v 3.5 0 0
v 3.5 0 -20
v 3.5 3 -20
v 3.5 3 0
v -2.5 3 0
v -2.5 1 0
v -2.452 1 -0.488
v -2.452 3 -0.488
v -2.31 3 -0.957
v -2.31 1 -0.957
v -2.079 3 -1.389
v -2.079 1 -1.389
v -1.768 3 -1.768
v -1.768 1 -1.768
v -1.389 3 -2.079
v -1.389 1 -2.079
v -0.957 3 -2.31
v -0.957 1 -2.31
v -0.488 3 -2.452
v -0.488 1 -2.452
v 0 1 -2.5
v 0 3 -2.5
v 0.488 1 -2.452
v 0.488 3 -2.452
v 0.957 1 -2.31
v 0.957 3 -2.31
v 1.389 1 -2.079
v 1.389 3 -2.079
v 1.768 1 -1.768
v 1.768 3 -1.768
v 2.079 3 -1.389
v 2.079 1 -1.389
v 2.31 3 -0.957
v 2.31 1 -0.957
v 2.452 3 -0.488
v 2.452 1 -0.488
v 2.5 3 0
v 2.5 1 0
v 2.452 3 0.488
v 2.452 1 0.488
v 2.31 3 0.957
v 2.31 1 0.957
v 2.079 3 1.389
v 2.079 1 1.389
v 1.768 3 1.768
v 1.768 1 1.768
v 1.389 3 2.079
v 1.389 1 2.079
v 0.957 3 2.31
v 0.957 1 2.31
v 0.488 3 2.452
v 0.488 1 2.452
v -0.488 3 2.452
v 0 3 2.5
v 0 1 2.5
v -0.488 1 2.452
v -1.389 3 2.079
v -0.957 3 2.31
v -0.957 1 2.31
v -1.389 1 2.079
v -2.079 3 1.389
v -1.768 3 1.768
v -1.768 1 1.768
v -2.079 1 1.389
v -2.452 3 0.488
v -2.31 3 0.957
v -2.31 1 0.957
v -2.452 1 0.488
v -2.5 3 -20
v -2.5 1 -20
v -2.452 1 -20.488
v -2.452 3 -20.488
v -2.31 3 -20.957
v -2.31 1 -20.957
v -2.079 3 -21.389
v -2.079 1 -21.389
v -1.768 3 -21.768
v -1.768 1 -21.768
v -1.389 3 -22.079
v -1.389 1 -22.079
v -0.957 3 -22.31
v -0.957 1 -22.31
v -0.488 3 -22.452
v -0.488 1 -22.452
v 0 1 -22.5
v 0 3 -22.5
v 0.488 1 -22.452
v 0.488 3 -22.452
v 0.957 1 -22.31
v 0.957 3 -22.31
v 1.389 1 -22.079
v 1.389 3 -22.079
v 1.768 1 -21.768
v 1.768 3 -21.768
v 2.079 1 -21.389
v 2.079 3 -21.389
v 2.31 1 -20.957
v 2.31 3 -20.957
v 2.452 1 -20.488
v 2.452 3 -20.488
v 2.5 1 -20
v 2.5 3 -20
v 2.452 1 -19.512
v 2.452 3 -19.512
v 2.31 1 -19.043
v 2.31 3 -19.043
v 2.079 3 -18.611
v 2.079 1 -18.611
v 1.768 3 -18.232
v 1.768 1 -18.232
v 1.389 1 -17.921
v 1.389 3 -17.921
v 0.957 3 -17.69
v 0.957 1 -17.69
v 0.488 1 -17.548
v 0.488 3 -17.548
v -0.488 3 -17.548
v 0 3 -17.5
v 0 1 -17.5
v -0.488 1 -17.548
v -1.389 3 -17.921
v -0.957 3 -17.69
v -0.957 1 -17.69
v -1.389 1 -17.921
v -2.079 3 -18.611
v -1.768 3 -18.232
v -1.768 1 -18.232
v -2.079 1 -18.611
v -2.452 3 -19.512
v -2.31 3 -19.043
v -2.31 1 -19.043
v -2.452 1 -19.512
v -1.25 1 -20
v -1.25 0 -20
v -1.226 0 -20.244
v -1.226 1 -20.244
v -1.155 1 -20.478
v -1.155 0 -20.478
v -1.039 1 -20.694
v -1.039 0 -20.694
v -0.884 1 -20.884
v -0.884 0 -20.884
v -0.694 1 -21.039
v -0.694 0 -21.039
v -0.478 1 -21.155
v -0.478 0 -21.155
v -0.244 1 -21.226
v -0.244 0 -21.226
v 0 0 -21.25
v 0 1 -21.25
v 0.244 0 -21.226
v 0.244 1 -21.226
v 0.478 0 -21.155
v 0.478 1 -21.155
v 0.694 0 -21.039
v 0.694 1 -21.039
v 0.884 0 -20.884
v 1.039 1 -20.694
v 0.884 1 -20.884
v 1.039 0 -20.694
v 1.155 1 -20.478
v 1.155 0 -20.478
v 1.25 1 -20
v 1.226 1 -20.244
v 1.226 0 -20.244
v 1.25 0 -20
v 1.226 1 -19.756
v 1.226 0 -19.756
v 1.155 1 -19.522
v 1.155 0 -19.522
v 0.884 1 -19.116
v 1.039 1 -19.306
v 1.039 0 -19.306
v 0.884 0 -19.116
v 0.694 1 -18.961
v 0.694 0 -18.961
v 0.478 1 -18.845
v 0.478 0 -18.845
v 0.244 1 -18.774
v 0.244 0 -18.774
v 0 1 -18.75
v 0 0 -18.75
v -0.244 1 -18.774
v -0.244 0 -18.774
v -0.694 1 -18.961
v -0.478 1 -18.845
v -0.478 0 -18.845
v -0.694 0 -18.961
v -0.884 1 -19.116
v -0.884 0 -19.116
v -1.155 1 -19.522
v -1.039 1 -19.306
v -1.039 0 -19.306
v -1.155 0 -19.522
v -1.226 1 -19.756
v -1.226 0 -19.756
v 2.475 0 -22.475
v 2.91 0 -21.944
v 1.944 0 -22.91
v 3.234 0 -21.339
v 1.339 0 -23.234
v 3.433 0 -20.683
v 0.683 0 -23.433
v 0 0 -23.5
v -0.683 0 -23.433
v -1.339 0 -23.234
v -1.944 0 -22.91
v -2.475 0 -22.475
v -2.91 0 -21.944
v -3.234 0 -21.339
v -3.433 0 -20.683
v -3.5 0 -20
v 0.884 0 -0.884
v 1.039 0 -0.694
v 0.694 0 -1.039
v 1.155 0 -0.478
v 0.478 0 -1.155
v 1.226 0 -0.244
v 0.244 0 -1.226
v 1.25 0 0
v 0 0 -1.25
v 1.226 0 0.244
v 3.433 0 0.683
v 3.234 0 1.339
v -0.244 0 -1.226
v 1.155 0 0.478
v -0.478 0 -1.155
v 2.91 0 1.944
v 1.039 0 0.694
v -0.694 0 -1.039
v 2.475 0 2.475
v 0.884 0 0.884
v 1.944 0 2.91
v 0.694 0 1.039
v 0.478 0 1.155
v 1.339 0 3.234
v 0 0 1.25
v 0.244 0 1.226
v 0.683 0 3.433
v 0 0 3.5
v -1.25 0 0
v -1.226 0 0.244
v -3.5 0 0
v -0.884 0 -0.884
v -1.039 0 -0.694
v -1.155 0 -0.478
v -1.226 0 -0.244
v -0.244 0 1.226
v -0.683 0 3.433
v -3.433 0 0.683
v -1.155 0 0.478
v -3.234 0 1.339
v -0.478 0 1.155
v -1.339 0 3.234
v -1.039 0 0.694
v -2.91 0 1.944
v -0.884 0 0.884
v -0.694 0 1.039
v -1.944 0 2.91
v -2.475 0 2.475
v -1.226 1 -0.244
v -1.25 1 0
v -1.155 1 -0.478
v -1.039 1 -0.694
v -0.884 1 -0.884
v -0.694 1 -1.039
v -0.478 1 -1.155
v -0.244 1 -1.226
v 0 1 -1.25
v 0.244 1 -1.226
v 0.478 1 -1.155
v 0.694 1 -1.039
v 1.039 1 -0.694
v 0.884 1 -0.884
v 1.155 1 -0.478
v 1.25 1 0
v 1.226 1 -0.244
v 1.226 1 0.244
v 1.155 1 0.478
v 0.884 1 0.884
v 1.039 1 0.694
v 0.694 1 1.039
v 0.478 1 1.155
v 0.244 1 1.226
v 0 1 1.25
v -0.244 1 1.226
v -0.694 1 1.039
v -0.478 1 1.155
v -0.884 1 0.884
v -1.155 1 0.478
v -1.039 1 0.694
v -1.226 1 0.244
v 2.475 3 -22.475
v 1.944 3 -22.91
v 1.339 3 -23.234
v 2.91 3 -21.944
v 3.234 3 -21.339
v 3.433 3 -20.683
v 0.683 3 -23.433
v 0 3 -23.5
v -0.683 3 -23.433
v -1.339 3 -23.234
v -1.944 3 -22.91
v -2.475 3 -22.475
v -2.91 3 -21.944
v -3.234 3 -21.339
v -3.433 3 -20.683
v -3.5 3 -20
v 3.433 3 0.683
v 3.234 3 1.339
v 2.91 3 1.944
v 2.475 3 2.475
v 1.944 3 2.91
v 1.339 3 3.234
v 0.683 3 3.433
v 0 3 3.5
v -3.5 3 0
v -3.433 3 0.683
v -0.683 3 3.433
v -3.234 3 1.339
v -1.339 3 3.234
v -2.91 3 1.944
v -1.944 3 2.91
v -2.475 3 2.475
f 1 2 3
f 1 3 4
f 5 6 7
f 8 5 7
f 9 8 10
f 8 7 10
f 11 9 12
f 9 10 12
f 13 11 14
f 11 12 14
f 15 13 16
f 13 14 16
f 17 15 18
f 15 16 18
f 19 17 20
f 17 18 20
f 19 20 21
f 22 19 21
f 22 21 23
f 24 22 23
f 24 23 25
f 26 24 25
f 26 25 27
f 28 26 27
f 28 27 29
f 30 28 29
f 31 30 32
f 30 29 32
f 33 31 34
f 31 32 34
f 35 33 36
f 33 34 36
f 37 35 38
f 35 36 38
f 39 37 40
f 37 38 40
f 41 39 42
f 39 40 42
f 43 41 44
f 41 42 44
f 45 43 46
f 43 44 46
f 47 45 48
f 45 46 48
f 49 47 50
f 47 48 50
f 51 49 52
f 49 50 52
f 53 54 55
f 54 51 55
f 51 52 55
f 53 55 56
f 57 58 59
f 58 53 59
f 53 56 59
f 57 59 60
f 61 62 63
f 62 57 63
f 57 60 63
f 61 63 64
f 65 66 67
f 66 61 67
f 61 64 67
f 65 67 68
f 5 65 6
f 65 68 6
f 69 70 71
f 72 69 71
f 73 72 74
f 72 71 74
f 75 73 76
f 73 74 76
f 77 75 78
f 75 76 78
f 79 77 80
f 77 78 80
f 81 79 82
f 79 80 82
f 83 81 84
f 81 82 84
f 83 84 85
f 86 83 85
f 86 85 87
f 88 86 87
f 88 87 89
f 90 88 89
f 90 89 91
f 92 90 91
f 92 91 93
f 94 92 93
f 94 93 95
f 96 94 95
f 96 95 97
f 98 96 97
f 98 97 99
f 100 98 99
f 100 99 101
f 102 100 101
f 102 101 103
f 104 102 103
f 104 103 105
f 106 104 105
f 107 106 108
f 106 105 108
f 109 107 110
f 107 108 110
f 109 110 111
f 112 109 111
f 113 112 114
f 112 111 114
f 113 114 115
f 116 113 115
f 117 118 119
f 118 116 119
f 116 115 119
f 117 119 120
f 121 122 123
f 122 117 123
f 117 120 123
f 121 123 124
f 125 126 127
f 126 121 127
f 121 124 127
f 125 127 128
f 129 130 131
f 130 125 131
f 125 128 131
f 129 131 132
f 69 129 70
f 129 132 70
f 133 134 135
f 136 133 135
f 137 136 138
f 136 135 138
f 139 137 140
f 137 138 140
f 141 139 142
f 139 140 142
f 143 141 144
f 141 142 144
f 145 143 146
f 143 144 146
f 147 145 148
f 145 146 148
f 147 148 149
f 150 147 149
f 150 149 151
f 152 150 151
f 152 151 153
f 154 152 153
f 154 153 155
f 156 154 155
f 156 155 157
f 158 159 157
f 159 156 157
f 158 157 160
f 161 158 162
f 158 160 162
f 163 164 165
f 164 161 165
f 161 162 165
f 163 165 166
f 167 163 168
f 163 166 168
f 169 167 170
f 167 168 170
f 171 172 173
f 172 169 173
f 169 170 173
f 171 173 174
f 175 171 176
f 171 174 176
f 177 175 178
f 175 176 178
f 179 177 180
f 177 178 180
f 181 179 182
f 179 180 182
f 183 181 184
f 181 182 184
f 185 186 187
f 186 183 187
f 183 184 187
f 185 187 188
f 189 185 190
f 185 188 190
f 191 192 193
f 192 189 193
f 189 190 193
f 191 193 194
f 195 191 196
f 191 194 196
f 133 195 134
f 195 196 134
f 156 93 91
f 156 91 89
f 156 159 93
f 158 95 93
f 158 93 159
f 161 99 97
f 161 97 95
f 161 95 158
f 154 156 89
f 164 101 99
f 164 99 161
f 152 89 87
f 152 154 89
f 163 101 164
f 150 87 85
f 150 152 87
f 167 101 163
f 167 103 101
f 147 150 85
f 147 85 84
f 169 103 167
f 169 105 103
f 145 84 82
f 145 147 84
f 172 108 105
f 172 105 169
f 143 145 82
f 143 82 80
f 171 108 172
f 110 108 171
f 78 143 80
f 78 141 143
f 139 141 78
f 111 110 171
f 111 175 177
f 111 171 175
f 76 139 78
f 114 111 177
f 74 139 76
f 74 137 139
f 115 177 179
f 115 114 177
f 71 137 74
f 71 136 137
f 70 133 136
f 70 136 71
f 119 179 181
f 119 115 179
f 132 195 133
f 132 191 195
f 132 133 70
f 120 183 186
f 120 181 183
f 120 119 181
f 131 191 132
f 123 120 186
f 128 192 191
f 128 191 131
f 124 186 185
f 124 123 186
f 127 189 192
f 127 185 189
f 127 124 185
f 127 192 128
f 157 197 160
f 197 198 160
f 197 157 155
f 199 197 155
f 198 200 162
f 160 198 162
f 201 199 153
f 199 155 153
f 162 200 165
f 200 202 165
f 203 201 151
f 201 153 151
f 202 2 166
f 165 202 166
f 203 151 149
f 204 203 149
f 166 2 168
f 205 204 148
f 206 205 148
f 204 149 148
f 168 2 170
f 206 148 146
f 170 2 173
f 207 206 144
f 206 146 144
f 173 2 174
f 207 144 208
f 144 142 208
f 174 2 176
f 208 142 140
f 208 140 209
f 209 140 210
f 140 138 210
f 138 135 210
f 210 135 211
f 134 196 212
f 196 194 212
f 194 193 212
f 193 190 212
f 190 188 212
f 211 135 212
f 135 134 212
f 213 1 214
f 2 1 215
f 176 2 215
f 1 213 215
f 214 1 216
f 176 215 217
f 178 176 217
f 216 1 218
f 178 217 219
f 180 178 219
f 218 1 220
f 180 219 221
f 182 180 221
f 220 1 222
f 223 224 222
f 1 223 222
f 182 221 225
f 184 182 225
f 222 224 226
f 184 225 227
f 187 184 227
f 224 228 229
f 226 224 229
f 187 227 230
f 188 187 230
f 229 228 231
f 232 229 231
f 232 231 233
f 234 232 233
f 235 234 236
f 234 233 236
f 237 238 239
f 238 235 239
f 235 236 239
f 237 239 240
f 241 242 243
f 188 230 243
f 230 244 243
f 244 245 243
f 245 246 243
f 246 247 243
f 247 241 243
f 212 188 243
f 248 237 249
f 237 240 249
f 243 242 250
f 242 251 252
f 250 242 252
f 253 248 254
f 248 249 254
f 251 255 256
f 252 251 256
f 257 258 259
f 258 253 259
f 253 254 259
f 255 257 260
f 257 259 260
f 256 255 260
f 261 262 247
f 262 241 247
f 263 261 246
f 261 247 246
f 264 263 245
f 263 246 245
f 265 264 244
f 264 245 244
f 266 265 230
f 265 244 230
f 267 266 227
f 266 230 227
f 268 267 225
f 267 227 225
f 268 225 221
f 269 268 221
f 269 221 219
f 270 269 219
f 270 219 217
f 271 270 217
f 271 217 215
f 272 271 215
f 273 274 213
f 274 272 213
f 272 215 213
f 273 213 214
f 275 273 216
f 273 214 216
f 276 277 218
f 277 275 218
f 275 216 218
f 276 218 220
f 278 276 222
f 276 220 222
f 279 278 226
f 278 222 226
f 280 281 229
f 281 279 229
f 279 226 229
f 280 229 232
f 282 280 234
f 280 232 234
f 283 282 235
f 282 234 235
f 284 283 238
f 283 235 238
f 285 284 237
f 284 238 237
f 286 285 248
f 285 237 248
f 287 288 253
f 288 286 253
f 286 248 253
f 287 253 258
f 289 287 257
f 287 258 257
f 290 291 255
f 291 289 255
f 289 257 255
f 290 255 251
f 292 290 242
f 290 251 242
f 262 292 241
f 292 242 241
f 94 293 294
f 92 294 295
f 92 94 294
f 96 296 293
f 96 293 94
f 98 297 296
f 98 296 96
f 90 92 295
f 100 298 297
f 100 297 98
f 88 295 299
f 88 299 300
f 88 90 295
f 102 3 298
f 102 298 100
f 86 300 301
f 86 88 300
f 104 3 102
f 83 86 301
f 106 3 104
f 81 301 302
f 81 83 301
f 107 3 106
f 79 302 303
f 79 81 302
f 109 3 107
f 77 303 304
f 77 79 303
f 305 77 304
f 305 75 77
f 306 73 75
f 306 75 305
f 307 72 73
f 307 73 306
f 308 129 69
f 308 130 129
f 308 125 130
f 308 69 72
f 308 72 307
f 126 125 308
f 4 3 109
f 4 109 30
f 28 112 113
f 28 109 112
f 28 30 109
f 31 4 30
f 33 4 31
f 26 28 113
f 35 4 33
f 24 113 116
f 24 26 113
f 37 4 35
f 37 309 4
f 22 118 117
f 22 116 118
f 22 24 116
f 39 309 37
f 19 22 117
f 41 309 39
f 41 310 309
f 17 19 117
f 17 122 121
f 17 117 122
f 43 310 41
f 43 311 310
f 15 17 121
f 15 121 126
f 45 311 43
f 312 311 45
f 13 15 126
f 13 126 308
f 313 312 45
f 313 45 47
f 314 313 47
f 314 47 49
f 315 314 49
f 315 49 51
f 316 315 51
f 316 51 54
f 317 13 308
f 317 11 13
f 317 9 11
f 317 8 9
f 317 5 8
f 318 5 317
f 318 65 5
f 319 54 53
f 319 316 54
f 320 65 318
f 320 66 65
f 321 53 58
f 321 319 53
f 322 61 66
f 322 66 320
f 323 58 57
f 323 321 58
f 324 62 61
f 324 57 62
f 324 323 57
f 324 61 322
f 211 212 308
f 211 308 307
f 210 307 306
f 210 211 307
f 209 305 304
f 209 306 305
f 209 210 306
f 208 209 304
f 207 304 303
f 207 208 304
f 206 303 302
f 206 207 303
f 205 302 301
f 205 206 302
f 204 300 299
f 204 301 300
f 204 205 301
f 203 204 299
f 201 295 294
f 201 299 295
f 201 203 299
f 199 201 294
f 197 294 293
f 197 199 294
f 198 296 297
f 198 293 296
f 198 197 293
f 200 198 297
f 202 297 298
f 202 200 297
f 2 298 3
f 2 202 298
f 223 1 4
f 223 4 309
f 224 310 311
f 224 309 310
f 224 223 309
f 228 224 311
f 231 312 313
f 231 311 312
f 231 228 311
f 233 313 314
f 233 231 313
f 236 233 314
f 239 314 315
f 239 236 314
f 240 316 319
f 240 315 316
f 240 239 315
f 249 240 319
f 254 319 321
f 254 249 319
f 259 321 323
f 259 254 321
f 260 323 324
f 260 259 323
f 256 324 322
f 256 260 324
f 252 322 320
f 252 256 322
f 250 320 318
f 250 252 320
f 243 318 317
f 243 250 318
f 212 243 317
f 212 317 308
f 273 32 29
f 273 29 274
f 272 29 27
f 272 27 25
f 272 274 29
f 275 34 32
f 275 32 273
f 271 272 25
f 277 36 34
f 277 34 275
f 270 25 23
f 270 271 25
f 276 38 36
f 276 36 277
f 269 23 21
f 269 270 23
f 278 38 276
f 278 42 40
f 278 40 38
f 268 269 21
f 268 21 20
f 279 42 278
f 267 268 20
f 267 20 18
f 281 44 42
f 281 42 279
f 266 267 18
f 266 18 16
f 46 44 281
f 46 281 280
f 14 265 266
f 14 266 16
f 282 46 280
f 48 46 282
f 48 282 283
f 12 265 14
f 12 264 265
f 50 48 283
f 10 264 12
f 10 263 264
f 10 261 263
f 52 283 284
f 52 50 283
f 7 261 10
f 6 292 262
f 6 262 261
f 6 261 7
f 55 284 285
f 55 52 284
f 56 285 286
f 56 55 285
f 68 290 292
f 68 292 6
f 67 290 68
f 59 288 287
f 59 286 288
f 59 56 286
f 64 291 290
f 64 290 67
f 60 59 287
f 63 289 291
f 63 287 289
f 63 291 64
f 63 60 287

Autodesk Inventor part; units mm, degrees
ref_plane "YZ Plane" through (0, 0, 0) normal (1, 0, 0) x (0, 1, 0)
ref_plane "XZ Plane" through (0, 0, 0) normal (0, 1, 0) x (-1, 0, 0)
ref_plane "XY Plane" through (0, 0, 0) normal (0, 0, 1) x (1, 0, 0)
sketch "Sketch1" plane through (0, 0, 0) normal (0, 1, 0) x (-1, 0, 0)
  circle A0 centre (0, 0) radius 3.5
  circle A1 centre (0, -20) radius 3.5
  line L0 (3.5, 0) -> (3.5, -20)
  line L1 (-3.5, -20) -> (-3.5, 0)
  line L2 (0, 0) -> (0, -20) construction
  circle A2 centre (0, 0) radius 1.25
  circle A3 centre (0, -20) radius 1.25
  circle A4 centre (0, -20) radius 2.5
  circle A5 centre (0, 0) radius 2.5
  dimension "d0" = 7
  dimension "d1" = 2.5
  dimension "d2" = 20
  dimension "d5" = 5
  dimension "d6" = 5
extrude "Extrusion1" add sketch "Sketch1" along normal blind 3 contours A0 | L0 A1 L1 A0 | A1
extrude "Extrusion2" add sketch "Sketch1" along normal blind 1 contours A4 | A5
properties part number "Link_3DPrint"
